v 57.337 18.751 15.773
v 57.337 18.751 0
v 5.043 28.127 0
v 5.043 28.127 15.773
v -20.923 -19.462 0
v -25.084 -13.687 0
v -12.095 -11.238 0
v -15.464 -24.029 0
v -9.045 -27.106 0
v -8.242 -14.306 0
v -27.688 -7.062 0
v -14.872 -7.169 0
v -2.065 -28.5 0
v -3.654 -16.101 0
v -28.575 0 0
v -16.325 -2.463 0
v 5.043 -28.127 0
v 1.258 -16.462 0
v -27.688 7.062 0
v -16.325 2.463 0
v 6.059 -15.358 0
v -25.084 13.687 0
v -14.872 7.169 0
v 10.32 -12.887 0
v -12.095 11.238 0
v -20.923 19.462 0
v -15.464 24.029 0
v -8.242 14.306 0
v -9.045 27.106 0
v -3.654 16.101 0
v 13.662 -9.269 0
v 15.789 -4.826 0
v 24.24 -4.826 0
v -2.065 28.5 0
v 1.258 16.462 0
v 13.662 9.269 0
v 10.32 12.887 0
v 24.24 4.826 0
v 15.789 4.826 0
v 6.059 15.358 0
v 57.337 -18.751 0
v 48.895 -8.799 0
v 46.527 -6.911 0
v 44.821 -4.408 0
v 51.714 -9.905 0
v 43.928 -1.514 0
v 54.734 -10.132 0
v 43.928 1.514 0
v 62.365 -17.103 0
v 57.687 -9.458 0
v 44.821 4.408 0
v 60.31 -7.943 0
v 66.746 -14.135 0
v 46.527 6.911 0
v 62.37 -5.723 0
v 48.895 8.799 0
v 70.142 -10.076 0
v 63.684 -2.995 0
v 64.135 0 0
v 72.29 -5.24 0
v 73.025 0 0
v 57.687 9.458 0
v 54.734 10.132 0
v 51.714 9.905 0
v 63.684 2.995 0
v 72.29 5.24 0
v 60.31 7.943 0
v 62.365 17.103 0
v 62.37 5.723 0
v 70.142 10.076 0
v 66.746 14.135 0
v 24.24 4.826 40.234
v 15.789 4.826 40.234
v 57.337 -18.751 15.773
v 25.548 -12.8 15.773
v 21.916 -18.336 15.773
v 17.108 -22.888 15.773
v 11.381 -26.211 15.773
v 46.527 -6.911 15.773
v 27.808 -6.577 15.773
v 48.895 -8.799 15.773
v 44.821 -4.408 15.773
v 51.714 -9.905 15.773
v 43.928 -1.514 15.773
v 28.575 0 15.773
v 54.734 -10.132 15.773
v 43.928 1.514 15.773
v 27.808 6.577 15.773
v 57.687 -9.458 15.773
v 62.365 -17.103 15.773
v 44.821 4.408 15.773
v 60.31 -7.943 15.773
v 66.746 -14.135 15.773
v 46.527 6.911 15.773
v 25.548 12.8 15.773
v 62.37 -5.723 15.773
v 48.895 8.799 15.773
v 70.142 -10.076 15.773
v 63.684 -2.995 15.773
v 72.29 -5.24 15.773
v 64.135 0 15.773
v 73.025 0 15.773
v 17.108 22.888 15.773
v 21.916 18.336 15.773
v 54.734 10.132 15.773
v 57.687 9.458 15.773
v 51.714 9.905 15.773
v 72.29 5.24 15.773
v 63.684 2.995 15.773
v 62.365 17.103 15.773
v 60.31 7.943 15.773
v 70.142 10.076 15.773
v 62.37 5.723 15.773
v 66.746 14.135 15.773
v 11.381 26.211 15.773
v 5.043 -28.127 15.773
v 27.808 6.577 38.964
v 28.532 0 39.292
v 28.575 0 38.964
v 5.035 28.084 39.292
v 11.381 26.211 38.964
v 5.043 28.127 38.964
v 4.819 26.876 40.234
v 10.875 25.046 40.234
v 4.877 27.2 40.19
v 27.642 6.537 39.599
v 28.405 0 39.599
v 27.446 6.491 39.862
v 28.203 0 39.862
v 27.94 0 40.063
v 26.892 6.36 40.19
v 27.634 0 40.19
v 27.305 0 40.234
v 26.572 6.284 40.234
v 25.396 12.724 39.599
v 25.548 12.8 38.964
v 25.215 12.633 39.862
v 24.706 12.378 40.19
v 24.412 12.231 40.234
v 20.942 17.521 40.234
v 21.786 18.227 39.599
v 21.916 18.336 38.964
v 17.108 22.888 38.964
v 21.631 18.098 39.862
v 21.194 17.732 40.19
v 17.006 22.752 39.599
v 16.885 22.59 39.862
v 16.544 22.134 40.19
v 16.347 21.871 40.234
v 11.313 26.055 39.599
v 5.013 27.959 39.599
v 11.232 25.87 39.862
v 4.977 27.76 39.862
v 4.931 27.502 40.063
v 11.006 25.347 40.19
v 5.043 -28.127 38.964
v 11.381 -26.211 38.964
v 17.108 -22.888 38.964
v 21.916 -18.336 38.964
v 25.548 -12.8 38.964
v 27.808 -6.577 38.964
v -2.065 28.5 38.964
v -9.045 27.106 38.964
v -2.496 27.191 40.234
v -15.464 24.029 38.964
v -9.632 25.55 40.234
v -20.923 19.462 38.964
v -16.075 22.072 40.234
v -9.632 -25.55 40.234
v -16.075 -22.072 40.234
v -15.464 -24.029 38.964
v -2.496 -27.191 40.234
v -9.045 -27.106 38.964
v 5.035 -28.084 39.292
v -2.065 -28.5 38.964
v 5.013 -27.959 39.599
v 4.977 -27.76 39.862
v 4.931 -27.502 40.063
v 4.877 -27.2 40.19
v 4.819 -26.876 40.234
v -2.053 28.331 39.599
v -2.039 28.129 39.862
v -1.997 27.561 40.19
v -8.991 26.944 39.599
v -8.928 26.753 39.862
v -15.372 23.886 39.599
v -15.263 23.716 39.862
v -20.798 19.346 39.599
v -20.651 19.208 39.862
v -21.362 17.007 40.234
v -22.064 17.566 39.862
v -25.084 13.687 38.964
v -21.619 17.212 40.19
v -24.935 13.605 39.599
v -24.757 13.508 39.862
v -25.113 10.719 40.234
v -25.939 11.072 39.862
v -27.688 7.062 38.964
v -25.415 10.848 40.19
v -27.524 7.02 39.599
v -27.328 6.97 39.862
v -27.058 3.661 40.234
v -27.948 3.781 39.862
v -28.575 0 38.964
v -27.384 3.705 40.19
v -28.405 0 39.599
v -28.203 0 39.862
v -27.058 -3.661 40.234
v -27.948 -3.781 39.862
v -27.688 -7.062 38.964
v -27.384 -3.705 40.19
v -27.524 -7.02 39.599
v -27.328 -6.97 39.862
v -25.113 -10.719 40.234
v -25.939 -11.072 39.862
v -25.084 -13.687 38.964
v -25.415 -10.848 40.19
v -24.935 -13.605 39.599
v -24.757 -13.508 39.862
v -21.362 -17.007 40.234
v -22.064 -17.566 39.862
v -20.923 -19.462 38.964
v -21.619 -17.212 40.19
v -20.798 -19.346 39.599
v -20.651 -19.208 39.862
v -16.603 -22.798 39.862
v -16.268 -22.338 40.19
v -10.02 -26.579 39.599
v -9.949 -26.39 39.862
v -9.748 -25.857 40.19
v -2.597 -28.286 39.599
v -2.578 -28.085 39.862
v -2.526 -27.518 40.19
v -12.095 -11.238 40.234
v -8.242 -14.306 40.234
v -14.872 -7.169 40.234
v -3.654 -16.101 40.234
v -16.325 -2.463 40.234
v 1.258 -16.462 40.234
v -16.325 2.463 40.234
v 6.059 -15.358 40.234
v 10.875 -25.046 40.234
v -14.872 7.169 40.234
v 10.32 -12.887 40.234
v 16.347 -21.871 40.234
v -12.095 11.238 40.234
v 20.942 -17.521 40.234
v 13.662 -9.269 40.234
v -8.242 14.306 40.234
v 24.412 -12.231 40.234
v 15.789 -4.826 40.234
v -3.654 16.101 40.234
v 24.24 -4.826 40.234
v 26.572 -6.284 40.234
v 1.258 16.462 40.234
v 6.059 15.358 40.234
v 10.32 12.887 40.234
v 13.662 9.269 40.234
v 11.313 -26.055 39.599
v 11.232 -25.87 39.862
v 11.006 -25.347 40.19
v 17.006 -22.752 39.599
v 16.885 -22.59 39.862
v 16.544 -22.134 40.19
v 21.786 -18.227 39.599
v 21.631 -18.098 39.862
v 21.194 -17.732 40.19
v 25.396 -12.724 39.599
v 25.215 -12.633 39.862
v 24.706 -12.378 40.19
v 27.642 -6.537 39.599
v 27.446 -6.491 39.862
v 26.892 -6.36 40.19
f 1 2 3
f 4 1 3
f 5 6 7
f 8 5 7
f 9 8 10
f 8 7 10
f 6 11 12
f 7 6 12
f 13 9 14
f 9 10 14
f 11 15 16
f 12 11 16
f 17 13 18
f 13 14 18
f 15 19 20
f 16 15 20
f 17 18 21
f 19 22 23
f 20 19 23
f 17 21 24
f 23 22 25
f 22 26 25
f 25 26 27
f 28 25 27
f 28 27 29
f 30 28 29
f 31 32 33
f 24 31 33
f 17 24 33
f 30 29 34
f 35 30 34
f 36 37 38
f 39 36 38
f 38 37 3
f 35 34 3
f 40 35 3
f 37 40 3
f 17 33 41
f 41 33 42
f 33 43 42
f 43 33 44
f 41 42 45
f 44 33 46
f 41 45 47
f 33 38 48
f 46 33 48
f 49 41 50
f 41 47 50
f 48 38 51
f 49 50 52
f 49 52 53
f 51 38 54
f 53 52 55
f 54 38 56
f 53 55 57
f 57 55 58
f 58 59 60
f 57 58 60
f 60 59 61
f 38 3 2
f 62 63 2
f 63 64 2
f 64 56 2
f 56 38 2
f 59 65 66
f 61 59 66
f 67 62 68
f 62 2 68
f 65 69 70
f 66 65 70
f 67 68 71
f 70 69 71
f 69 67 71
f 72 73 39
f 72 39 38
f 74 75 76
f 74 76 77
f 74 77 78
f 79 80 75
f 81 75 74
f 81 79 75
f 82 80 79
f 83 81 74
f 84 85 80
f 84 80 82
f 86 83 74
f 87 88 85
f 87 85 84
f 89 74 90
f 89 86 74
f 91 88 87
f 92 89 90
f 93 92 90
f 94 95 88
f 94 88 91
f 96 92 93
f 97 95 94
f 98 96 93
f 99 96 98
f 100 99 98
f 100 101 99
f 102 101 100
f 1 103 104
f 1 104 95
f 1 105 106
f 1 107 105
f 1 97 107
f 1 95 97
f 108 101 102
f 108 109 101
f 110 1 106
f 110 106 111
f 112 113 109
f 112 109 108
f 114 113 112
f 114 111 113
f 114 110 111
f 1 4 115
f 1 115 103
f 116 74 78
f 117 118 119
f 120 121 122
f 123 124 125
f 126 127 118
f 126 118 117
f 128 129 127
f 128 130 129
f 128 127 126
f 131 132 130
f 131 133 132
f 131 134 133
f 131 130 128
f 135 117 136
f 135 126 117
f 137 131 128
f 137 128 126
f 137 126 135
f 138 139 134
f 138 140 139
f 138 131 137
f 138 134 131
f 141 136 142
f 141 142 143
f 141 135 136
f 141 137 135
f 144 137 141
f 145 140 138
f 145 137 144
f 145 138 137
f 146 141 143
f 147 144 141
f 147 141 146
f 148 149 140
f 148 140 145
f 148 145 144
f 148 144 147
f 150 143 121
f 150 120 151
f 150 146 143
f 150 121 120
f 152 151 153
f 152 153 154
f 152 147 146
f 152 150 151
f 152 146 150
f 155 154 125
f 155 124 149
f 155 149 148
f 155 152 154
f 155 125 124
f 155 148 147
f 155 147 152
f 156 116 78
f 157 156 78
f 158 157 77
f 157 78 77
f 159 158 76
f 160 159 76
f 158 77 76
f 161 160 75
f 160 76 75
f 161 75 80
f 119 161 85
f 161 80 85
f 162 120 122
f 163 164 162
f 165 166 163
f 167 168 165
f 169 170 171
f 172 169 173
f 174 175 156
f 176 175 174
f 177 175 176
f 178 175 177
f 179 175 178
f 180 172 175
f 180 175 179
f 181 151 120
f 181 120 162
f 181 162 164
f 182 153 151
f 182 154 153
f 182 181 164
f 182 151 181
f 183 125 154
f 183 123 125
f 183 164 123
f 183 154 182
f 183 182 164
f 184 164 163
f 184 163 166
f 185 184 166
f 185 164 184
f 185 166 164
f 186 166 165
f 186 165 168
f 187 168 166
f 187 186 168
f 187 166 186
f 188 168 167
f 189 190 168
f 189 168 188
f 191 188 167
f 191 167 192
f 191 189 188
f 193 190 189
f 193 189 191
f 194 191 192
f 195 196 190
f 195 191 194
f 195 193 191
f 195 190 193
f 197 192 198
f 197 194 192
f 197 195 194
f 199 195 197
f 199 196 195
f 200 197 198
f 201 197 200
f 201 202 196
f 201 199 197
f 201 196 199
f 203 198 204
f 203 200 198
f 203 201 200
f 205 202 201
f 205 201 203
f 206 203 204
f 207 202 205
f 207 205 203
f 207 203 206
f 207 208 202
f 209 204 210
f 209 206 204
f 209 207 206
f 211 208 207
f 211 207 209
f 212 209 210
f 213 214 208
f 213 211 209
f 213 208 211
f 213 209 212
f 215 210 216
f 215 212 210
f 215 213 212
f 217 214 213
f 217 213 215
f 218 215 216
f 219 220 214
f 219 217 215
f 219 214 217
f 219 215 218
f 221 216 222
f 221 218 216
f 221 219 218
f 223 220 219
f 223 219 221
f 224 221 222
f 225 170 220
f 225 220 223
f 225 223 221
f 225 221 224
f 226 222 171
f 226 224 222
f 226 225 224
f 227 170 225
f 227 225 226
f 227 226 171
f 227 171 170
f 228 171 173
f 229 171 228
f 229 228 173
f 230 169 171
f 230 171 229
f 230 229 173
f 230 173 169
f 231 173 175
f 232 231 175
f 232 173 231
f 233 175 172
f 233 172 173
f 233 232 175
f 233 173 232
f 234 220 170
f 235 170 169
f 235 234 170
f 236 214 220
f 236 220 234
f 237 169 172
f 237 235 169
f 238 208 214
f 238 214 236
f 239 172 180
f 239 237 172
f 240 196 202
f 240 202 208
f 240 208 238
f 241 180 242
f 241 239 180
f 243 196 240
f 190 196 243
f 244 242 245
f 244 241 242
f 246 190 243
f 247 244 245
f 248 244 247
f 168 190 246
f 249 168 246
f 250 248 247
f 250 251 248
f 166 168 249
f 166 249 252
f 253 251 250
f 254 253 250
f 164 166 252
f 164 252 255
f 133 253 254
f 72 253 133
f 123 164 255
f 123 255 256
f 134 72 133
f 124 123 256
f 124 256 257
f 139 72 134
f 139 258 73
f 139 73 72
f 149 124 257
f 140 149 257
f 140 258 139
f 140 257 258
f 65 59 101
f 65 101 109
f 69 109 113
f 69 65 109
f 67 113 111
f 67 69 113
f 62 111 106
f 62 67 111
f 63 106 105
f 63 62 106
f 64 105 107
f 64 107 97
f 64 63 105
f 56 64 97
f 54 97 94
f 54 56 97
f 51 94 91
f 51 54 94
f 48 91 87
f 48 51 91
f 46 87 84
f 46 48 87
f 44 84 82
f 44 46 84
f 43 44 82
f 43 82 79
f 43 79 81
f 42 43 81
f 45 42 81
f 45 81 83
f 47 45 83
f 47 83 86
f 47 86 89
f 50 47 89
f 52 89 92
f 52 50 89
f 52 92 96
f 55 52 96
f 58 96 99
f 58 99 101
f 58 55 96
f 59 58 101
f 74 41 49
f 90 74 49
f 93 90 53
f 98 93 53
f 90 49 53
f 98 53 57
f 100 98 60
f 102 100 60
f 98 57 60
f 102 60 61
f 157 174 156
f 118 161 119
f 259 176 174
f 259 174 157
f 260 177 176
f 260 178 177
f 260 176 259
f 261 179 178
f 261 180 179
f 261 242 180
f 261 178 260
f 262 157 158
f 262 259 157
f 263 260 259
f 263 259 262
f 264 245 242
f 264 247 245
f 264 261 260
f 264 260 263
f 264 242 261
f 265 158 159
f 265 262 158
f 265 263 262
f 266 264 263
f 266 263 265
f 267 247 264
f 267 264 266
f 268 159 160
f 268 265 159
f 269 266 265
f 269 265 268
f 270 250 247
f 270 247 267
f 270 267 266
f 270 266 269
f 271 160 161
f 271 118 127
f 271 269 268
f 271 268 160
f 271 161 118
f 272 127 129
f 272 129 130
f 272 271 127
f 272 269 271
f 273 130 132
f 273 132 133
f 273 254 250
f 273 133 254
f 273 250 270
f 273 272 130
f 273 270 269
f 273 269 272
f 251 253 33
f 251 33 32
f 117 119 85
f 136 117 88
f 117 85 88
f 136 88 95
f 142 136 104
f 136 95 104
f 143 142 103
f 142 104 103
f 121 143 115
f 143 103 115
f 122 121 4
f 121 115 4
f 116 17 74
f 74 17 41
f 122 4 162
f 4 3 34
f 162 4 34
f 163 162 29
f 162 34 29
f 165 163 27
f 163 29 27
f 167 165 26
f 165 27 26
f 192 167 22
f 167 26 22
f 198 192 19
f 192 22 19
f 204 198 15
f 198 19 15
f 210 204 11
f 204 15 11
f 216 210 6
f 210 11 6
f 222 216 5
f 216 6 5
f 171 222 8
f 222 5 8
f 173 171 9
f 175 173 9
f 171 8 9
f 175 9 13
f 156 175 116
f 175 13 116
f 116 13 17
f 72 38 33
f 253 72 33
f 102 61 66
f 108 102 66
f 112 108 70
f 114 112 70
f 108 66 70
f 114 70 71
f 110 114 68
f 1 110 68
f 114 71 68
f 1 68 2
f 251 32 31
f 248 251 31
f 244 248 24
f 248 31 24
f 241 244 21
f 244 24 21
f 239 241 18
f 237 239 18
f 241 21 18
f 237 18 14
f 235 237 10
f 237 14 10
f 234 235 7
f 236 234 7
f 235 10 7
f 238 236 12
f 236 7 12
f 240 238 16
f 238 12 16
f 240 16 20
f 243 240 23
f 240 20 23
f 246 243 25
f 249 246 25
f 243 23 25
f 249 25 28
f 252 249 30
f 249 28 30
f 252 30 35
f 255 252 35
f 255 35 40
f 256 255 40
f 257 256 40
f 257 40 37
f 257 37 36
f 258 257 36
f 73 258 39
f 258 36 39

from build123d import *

# Parameters (mm, degrees)
F1_DEPTH = 40.2336
F0_R     = 10.16
F2_DEPTH = 15.7734
F3_R     = 1.27


with BuildPart() as f1:
    # F0 (on Top) → F1 (new body)
    with BuildSketch(Plane.XY):
        with BuildLine():
            ThreePointArc((5.042647, -28.126541), (21.916025, -18.336262), (28.575, 0))
            ThreePointArc((28.575, 0), (21.916025, 18.336262), (5.042647, 28.126541))
            ThreePointArc((5.042647, 28.126541), (-28.575, 0), (5.042647, -28.126541))
        make_face()
        with BuildLine():
            ThreePointArc((15.788915, -4.826), (-16.51, 0), (15.788915, 4.826))
            Line((15.788915, 4.826), (24.240017, 4.826))
            Line((24.240017, 4.826), (24.240017, -4.826))
            Line((24.240017, -4.826), (15.788915, -4.826))
        make_face(mode=Mode.SUBTRACT)
    extrude(amount=F1_DEPTH)

    # F0 (on Top) → F2 (join)
    with BuildSketch(Plane.XY):
        with BuildLine():
            ThreePointArc((73.025, 0), (68.585683, 12.224174), (57.336765, 18.751028))
            ThreePointArc((57.336765, 18.751028), (34.925, 0), (57.336765, -18.751028))
            ThreePointArc((57.336765, -18.751028), (68.585683, -12.224174), (73.025, 0))
        make_face()
        with Locations((53.975, 0)):
            Circle(F0_R, mode=Mode.SUBTRACT)
        with BuildLine():
            ThreePointArc((5.042647, 28.126541), (21.916025, 18.336262), (28.575, 0))
            ThreePointArc((28.575, 0), (21.916025, -18.336262), (5.042647, -28.126541))
            Line((5.042647, -28.126541), (57.336765, -18.751028))
            ThreePointArc((57.336765, -18.751028), (34.925, 0), (57.336765, 18.751028))
            Line((57.336765, 18.751028), (5.042647, 28.126541))
        make_face()
    extrude(amount=F2_DEPTH)

    # F3
    f3_edges = [f1.edges().sort_by_distance(p)[0] for p in [
        (-5.042647, 28.126541, 40.2336),
    ]]
    fillet(f3_edges, radius=F3_R)


solid = f1.part
